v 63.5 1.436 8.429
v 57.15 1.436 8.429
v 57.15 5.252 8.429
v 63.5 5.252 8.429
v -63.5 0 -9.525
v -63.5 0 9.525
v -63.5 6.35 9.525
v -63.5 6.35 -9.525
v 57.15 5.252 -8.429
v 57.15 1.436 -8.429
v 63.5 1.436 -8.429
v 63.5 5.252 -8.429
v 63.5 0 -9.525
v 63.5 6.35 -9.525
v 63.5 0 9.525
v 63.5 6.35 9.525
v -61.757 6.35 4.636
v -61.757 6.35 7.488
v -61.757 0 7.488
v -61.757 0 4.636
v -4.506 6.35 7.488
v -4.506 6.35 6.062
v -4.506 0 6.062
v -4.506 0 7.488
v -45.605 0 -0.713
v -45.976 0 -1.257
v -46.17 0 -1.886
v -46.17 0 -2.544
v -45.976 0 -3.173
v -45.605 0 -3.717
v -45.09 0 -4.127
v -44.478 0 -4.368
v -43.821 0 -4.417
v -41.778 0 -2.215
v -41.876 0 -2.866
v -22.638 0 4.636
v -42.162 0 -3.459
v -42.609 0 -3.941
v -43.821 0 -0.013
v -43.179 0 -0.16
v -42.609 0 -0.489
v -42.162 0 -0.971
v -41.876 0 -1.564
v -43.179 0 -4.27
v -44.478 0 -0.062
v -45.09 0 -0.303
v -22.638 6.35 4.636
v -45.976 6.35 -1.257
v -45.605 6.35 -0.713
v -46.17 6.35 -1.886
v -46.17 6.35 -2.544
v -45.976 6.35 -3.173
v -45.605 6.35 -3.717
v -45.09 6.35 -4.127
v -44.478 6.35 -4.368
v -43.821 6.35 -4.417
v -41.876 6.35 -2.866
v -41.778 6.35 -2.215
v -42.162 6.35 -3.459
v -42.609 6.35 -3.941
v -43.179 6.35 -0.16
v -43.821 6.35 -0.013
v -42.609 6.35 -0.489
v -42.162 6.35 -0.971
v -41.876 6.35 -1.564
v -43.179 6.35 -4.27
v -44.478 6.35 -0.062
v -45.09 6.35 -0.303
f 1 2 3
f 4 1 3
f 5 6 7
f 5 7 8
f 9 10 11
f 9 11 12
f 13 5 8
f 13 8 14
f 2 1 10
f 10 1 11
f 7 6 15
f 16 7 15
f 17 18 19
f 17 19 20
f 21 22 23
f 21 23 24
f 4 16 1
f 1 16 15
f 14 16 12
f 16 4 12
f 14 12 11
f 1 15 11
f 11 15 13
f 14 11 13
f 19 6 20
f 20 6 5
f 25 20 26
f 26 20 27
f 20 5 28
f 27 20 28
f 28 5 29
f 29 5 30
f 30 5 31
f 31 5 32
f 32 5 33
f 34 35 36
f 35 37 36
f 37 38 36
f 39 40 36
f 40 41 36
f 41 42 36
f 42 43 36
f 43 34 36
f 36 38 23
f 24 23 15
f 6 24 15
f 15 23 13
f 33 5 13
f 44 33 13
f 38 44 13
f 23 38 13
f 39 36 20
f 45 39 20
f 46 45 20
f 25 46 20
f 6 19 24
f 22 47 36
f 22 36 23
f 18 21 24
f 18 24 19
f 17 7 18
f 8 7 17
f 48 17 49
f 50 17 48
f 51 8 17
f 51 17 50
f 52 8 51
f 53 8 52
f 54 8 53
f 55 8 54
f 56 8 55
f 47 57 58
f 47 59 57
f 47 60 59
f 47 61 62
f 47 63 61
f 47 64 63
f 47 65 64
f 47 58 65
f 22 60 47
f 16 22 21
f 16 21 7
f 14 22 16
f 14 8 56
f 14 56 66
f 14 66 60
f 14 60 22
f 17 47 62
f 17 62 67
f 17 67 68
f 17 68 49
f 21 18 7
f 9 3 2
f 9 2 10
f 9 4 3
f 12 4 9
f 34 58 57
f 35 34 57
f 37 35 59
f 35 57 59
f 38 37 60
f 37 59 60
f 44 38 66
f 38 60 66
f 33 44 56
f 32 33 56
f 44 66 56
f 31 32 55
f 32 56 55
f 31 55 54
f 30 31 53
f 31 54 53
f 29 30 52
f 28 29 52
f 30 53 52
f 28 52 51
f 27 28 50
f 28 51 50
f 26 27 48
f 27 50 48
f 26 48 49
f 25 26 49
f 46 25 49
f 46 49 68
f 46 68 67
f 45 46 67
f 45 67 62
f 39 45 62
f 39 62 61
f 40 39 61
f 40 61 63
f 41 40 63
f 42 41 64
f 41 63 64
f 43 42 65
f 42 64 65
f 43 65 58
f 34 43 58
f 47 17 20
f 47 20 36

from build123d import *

# Parameters (mm, degrees)
SKETCH2_W           = 127
SKETCH2_H           = 19.05
BOSS_EXTRUDE1_DEPTH = 6.35
SKETCH3_W           = 16.857329018
SKETCH3_H           = 3.81675374
CUT_EXTRUDE1_DEPTH  = 6.35
CUT_EXTRUDE2_DEPTH  = 7.35
SKETCH5_R           = 2.208058356
CUT_EXTRUDE3_DEPTH  = 6.35


with BuildPart() as part:
    # Sketch2 → Boss-Extrude1 (new body)
    with BuildSketch(Plane(origin=(0, 0, 0), x_dir=(1, 0, 0), z_dir=(0, 1, 0))):
        Rectangle(SKETCH2_W, SKETCH2_H)
    extrude(amount=BOSS_EXTRUDE1_DEPTH)

    # Sketch3 → Cut-Extrude1 (cut)
    with BuildSketch(Plane(origin=(63.5, 0, 0), x_dir=(0, 0, -1), z_dir=(1, 0, 0))):
        with Locations((0, 3.343970869)):
            Rectangle(SKETCH3_W, SKETCH3_H)
    extrude(amount=-CUT_EXTRUDE1_DEPTH, mode=Mode.SUBTRACT)

    # Sketch4 → Cut-Extrude2 (cut, through all)
    with BuildSketch(Plane(origin=(0, 6.35, 0), x_dir=(1, 0, 0), z_dir=(0, 1, 0))):
        Polygon((-22.637713534, -4.636428392), (-4.505889832, -6.062078542), (-4.505889832, -7.487728691), (-61.757195928, -7.487728691), (-61.757195928, -4.636428392), align=None)
    extrude(amount=-CUT_EXTRUDE2_DEPTH, mode=Mode.SUBTRACT)

    # Sketch5 → Cut-Extrude3 (cut)
    with BuildSketch(Plane(origin=(0, 6.35, 0), x_dir=(1, 0, 0), z_dir=(0, 1, 0))):
        with Locations((-43.986162308, 2.214937446)):
            Circle(SKETCH5_R)
    extrude(amount=-CUT_EXTRUDE3_DEPTH, mode=Mode.SUBTRACT)


solid = part.part
